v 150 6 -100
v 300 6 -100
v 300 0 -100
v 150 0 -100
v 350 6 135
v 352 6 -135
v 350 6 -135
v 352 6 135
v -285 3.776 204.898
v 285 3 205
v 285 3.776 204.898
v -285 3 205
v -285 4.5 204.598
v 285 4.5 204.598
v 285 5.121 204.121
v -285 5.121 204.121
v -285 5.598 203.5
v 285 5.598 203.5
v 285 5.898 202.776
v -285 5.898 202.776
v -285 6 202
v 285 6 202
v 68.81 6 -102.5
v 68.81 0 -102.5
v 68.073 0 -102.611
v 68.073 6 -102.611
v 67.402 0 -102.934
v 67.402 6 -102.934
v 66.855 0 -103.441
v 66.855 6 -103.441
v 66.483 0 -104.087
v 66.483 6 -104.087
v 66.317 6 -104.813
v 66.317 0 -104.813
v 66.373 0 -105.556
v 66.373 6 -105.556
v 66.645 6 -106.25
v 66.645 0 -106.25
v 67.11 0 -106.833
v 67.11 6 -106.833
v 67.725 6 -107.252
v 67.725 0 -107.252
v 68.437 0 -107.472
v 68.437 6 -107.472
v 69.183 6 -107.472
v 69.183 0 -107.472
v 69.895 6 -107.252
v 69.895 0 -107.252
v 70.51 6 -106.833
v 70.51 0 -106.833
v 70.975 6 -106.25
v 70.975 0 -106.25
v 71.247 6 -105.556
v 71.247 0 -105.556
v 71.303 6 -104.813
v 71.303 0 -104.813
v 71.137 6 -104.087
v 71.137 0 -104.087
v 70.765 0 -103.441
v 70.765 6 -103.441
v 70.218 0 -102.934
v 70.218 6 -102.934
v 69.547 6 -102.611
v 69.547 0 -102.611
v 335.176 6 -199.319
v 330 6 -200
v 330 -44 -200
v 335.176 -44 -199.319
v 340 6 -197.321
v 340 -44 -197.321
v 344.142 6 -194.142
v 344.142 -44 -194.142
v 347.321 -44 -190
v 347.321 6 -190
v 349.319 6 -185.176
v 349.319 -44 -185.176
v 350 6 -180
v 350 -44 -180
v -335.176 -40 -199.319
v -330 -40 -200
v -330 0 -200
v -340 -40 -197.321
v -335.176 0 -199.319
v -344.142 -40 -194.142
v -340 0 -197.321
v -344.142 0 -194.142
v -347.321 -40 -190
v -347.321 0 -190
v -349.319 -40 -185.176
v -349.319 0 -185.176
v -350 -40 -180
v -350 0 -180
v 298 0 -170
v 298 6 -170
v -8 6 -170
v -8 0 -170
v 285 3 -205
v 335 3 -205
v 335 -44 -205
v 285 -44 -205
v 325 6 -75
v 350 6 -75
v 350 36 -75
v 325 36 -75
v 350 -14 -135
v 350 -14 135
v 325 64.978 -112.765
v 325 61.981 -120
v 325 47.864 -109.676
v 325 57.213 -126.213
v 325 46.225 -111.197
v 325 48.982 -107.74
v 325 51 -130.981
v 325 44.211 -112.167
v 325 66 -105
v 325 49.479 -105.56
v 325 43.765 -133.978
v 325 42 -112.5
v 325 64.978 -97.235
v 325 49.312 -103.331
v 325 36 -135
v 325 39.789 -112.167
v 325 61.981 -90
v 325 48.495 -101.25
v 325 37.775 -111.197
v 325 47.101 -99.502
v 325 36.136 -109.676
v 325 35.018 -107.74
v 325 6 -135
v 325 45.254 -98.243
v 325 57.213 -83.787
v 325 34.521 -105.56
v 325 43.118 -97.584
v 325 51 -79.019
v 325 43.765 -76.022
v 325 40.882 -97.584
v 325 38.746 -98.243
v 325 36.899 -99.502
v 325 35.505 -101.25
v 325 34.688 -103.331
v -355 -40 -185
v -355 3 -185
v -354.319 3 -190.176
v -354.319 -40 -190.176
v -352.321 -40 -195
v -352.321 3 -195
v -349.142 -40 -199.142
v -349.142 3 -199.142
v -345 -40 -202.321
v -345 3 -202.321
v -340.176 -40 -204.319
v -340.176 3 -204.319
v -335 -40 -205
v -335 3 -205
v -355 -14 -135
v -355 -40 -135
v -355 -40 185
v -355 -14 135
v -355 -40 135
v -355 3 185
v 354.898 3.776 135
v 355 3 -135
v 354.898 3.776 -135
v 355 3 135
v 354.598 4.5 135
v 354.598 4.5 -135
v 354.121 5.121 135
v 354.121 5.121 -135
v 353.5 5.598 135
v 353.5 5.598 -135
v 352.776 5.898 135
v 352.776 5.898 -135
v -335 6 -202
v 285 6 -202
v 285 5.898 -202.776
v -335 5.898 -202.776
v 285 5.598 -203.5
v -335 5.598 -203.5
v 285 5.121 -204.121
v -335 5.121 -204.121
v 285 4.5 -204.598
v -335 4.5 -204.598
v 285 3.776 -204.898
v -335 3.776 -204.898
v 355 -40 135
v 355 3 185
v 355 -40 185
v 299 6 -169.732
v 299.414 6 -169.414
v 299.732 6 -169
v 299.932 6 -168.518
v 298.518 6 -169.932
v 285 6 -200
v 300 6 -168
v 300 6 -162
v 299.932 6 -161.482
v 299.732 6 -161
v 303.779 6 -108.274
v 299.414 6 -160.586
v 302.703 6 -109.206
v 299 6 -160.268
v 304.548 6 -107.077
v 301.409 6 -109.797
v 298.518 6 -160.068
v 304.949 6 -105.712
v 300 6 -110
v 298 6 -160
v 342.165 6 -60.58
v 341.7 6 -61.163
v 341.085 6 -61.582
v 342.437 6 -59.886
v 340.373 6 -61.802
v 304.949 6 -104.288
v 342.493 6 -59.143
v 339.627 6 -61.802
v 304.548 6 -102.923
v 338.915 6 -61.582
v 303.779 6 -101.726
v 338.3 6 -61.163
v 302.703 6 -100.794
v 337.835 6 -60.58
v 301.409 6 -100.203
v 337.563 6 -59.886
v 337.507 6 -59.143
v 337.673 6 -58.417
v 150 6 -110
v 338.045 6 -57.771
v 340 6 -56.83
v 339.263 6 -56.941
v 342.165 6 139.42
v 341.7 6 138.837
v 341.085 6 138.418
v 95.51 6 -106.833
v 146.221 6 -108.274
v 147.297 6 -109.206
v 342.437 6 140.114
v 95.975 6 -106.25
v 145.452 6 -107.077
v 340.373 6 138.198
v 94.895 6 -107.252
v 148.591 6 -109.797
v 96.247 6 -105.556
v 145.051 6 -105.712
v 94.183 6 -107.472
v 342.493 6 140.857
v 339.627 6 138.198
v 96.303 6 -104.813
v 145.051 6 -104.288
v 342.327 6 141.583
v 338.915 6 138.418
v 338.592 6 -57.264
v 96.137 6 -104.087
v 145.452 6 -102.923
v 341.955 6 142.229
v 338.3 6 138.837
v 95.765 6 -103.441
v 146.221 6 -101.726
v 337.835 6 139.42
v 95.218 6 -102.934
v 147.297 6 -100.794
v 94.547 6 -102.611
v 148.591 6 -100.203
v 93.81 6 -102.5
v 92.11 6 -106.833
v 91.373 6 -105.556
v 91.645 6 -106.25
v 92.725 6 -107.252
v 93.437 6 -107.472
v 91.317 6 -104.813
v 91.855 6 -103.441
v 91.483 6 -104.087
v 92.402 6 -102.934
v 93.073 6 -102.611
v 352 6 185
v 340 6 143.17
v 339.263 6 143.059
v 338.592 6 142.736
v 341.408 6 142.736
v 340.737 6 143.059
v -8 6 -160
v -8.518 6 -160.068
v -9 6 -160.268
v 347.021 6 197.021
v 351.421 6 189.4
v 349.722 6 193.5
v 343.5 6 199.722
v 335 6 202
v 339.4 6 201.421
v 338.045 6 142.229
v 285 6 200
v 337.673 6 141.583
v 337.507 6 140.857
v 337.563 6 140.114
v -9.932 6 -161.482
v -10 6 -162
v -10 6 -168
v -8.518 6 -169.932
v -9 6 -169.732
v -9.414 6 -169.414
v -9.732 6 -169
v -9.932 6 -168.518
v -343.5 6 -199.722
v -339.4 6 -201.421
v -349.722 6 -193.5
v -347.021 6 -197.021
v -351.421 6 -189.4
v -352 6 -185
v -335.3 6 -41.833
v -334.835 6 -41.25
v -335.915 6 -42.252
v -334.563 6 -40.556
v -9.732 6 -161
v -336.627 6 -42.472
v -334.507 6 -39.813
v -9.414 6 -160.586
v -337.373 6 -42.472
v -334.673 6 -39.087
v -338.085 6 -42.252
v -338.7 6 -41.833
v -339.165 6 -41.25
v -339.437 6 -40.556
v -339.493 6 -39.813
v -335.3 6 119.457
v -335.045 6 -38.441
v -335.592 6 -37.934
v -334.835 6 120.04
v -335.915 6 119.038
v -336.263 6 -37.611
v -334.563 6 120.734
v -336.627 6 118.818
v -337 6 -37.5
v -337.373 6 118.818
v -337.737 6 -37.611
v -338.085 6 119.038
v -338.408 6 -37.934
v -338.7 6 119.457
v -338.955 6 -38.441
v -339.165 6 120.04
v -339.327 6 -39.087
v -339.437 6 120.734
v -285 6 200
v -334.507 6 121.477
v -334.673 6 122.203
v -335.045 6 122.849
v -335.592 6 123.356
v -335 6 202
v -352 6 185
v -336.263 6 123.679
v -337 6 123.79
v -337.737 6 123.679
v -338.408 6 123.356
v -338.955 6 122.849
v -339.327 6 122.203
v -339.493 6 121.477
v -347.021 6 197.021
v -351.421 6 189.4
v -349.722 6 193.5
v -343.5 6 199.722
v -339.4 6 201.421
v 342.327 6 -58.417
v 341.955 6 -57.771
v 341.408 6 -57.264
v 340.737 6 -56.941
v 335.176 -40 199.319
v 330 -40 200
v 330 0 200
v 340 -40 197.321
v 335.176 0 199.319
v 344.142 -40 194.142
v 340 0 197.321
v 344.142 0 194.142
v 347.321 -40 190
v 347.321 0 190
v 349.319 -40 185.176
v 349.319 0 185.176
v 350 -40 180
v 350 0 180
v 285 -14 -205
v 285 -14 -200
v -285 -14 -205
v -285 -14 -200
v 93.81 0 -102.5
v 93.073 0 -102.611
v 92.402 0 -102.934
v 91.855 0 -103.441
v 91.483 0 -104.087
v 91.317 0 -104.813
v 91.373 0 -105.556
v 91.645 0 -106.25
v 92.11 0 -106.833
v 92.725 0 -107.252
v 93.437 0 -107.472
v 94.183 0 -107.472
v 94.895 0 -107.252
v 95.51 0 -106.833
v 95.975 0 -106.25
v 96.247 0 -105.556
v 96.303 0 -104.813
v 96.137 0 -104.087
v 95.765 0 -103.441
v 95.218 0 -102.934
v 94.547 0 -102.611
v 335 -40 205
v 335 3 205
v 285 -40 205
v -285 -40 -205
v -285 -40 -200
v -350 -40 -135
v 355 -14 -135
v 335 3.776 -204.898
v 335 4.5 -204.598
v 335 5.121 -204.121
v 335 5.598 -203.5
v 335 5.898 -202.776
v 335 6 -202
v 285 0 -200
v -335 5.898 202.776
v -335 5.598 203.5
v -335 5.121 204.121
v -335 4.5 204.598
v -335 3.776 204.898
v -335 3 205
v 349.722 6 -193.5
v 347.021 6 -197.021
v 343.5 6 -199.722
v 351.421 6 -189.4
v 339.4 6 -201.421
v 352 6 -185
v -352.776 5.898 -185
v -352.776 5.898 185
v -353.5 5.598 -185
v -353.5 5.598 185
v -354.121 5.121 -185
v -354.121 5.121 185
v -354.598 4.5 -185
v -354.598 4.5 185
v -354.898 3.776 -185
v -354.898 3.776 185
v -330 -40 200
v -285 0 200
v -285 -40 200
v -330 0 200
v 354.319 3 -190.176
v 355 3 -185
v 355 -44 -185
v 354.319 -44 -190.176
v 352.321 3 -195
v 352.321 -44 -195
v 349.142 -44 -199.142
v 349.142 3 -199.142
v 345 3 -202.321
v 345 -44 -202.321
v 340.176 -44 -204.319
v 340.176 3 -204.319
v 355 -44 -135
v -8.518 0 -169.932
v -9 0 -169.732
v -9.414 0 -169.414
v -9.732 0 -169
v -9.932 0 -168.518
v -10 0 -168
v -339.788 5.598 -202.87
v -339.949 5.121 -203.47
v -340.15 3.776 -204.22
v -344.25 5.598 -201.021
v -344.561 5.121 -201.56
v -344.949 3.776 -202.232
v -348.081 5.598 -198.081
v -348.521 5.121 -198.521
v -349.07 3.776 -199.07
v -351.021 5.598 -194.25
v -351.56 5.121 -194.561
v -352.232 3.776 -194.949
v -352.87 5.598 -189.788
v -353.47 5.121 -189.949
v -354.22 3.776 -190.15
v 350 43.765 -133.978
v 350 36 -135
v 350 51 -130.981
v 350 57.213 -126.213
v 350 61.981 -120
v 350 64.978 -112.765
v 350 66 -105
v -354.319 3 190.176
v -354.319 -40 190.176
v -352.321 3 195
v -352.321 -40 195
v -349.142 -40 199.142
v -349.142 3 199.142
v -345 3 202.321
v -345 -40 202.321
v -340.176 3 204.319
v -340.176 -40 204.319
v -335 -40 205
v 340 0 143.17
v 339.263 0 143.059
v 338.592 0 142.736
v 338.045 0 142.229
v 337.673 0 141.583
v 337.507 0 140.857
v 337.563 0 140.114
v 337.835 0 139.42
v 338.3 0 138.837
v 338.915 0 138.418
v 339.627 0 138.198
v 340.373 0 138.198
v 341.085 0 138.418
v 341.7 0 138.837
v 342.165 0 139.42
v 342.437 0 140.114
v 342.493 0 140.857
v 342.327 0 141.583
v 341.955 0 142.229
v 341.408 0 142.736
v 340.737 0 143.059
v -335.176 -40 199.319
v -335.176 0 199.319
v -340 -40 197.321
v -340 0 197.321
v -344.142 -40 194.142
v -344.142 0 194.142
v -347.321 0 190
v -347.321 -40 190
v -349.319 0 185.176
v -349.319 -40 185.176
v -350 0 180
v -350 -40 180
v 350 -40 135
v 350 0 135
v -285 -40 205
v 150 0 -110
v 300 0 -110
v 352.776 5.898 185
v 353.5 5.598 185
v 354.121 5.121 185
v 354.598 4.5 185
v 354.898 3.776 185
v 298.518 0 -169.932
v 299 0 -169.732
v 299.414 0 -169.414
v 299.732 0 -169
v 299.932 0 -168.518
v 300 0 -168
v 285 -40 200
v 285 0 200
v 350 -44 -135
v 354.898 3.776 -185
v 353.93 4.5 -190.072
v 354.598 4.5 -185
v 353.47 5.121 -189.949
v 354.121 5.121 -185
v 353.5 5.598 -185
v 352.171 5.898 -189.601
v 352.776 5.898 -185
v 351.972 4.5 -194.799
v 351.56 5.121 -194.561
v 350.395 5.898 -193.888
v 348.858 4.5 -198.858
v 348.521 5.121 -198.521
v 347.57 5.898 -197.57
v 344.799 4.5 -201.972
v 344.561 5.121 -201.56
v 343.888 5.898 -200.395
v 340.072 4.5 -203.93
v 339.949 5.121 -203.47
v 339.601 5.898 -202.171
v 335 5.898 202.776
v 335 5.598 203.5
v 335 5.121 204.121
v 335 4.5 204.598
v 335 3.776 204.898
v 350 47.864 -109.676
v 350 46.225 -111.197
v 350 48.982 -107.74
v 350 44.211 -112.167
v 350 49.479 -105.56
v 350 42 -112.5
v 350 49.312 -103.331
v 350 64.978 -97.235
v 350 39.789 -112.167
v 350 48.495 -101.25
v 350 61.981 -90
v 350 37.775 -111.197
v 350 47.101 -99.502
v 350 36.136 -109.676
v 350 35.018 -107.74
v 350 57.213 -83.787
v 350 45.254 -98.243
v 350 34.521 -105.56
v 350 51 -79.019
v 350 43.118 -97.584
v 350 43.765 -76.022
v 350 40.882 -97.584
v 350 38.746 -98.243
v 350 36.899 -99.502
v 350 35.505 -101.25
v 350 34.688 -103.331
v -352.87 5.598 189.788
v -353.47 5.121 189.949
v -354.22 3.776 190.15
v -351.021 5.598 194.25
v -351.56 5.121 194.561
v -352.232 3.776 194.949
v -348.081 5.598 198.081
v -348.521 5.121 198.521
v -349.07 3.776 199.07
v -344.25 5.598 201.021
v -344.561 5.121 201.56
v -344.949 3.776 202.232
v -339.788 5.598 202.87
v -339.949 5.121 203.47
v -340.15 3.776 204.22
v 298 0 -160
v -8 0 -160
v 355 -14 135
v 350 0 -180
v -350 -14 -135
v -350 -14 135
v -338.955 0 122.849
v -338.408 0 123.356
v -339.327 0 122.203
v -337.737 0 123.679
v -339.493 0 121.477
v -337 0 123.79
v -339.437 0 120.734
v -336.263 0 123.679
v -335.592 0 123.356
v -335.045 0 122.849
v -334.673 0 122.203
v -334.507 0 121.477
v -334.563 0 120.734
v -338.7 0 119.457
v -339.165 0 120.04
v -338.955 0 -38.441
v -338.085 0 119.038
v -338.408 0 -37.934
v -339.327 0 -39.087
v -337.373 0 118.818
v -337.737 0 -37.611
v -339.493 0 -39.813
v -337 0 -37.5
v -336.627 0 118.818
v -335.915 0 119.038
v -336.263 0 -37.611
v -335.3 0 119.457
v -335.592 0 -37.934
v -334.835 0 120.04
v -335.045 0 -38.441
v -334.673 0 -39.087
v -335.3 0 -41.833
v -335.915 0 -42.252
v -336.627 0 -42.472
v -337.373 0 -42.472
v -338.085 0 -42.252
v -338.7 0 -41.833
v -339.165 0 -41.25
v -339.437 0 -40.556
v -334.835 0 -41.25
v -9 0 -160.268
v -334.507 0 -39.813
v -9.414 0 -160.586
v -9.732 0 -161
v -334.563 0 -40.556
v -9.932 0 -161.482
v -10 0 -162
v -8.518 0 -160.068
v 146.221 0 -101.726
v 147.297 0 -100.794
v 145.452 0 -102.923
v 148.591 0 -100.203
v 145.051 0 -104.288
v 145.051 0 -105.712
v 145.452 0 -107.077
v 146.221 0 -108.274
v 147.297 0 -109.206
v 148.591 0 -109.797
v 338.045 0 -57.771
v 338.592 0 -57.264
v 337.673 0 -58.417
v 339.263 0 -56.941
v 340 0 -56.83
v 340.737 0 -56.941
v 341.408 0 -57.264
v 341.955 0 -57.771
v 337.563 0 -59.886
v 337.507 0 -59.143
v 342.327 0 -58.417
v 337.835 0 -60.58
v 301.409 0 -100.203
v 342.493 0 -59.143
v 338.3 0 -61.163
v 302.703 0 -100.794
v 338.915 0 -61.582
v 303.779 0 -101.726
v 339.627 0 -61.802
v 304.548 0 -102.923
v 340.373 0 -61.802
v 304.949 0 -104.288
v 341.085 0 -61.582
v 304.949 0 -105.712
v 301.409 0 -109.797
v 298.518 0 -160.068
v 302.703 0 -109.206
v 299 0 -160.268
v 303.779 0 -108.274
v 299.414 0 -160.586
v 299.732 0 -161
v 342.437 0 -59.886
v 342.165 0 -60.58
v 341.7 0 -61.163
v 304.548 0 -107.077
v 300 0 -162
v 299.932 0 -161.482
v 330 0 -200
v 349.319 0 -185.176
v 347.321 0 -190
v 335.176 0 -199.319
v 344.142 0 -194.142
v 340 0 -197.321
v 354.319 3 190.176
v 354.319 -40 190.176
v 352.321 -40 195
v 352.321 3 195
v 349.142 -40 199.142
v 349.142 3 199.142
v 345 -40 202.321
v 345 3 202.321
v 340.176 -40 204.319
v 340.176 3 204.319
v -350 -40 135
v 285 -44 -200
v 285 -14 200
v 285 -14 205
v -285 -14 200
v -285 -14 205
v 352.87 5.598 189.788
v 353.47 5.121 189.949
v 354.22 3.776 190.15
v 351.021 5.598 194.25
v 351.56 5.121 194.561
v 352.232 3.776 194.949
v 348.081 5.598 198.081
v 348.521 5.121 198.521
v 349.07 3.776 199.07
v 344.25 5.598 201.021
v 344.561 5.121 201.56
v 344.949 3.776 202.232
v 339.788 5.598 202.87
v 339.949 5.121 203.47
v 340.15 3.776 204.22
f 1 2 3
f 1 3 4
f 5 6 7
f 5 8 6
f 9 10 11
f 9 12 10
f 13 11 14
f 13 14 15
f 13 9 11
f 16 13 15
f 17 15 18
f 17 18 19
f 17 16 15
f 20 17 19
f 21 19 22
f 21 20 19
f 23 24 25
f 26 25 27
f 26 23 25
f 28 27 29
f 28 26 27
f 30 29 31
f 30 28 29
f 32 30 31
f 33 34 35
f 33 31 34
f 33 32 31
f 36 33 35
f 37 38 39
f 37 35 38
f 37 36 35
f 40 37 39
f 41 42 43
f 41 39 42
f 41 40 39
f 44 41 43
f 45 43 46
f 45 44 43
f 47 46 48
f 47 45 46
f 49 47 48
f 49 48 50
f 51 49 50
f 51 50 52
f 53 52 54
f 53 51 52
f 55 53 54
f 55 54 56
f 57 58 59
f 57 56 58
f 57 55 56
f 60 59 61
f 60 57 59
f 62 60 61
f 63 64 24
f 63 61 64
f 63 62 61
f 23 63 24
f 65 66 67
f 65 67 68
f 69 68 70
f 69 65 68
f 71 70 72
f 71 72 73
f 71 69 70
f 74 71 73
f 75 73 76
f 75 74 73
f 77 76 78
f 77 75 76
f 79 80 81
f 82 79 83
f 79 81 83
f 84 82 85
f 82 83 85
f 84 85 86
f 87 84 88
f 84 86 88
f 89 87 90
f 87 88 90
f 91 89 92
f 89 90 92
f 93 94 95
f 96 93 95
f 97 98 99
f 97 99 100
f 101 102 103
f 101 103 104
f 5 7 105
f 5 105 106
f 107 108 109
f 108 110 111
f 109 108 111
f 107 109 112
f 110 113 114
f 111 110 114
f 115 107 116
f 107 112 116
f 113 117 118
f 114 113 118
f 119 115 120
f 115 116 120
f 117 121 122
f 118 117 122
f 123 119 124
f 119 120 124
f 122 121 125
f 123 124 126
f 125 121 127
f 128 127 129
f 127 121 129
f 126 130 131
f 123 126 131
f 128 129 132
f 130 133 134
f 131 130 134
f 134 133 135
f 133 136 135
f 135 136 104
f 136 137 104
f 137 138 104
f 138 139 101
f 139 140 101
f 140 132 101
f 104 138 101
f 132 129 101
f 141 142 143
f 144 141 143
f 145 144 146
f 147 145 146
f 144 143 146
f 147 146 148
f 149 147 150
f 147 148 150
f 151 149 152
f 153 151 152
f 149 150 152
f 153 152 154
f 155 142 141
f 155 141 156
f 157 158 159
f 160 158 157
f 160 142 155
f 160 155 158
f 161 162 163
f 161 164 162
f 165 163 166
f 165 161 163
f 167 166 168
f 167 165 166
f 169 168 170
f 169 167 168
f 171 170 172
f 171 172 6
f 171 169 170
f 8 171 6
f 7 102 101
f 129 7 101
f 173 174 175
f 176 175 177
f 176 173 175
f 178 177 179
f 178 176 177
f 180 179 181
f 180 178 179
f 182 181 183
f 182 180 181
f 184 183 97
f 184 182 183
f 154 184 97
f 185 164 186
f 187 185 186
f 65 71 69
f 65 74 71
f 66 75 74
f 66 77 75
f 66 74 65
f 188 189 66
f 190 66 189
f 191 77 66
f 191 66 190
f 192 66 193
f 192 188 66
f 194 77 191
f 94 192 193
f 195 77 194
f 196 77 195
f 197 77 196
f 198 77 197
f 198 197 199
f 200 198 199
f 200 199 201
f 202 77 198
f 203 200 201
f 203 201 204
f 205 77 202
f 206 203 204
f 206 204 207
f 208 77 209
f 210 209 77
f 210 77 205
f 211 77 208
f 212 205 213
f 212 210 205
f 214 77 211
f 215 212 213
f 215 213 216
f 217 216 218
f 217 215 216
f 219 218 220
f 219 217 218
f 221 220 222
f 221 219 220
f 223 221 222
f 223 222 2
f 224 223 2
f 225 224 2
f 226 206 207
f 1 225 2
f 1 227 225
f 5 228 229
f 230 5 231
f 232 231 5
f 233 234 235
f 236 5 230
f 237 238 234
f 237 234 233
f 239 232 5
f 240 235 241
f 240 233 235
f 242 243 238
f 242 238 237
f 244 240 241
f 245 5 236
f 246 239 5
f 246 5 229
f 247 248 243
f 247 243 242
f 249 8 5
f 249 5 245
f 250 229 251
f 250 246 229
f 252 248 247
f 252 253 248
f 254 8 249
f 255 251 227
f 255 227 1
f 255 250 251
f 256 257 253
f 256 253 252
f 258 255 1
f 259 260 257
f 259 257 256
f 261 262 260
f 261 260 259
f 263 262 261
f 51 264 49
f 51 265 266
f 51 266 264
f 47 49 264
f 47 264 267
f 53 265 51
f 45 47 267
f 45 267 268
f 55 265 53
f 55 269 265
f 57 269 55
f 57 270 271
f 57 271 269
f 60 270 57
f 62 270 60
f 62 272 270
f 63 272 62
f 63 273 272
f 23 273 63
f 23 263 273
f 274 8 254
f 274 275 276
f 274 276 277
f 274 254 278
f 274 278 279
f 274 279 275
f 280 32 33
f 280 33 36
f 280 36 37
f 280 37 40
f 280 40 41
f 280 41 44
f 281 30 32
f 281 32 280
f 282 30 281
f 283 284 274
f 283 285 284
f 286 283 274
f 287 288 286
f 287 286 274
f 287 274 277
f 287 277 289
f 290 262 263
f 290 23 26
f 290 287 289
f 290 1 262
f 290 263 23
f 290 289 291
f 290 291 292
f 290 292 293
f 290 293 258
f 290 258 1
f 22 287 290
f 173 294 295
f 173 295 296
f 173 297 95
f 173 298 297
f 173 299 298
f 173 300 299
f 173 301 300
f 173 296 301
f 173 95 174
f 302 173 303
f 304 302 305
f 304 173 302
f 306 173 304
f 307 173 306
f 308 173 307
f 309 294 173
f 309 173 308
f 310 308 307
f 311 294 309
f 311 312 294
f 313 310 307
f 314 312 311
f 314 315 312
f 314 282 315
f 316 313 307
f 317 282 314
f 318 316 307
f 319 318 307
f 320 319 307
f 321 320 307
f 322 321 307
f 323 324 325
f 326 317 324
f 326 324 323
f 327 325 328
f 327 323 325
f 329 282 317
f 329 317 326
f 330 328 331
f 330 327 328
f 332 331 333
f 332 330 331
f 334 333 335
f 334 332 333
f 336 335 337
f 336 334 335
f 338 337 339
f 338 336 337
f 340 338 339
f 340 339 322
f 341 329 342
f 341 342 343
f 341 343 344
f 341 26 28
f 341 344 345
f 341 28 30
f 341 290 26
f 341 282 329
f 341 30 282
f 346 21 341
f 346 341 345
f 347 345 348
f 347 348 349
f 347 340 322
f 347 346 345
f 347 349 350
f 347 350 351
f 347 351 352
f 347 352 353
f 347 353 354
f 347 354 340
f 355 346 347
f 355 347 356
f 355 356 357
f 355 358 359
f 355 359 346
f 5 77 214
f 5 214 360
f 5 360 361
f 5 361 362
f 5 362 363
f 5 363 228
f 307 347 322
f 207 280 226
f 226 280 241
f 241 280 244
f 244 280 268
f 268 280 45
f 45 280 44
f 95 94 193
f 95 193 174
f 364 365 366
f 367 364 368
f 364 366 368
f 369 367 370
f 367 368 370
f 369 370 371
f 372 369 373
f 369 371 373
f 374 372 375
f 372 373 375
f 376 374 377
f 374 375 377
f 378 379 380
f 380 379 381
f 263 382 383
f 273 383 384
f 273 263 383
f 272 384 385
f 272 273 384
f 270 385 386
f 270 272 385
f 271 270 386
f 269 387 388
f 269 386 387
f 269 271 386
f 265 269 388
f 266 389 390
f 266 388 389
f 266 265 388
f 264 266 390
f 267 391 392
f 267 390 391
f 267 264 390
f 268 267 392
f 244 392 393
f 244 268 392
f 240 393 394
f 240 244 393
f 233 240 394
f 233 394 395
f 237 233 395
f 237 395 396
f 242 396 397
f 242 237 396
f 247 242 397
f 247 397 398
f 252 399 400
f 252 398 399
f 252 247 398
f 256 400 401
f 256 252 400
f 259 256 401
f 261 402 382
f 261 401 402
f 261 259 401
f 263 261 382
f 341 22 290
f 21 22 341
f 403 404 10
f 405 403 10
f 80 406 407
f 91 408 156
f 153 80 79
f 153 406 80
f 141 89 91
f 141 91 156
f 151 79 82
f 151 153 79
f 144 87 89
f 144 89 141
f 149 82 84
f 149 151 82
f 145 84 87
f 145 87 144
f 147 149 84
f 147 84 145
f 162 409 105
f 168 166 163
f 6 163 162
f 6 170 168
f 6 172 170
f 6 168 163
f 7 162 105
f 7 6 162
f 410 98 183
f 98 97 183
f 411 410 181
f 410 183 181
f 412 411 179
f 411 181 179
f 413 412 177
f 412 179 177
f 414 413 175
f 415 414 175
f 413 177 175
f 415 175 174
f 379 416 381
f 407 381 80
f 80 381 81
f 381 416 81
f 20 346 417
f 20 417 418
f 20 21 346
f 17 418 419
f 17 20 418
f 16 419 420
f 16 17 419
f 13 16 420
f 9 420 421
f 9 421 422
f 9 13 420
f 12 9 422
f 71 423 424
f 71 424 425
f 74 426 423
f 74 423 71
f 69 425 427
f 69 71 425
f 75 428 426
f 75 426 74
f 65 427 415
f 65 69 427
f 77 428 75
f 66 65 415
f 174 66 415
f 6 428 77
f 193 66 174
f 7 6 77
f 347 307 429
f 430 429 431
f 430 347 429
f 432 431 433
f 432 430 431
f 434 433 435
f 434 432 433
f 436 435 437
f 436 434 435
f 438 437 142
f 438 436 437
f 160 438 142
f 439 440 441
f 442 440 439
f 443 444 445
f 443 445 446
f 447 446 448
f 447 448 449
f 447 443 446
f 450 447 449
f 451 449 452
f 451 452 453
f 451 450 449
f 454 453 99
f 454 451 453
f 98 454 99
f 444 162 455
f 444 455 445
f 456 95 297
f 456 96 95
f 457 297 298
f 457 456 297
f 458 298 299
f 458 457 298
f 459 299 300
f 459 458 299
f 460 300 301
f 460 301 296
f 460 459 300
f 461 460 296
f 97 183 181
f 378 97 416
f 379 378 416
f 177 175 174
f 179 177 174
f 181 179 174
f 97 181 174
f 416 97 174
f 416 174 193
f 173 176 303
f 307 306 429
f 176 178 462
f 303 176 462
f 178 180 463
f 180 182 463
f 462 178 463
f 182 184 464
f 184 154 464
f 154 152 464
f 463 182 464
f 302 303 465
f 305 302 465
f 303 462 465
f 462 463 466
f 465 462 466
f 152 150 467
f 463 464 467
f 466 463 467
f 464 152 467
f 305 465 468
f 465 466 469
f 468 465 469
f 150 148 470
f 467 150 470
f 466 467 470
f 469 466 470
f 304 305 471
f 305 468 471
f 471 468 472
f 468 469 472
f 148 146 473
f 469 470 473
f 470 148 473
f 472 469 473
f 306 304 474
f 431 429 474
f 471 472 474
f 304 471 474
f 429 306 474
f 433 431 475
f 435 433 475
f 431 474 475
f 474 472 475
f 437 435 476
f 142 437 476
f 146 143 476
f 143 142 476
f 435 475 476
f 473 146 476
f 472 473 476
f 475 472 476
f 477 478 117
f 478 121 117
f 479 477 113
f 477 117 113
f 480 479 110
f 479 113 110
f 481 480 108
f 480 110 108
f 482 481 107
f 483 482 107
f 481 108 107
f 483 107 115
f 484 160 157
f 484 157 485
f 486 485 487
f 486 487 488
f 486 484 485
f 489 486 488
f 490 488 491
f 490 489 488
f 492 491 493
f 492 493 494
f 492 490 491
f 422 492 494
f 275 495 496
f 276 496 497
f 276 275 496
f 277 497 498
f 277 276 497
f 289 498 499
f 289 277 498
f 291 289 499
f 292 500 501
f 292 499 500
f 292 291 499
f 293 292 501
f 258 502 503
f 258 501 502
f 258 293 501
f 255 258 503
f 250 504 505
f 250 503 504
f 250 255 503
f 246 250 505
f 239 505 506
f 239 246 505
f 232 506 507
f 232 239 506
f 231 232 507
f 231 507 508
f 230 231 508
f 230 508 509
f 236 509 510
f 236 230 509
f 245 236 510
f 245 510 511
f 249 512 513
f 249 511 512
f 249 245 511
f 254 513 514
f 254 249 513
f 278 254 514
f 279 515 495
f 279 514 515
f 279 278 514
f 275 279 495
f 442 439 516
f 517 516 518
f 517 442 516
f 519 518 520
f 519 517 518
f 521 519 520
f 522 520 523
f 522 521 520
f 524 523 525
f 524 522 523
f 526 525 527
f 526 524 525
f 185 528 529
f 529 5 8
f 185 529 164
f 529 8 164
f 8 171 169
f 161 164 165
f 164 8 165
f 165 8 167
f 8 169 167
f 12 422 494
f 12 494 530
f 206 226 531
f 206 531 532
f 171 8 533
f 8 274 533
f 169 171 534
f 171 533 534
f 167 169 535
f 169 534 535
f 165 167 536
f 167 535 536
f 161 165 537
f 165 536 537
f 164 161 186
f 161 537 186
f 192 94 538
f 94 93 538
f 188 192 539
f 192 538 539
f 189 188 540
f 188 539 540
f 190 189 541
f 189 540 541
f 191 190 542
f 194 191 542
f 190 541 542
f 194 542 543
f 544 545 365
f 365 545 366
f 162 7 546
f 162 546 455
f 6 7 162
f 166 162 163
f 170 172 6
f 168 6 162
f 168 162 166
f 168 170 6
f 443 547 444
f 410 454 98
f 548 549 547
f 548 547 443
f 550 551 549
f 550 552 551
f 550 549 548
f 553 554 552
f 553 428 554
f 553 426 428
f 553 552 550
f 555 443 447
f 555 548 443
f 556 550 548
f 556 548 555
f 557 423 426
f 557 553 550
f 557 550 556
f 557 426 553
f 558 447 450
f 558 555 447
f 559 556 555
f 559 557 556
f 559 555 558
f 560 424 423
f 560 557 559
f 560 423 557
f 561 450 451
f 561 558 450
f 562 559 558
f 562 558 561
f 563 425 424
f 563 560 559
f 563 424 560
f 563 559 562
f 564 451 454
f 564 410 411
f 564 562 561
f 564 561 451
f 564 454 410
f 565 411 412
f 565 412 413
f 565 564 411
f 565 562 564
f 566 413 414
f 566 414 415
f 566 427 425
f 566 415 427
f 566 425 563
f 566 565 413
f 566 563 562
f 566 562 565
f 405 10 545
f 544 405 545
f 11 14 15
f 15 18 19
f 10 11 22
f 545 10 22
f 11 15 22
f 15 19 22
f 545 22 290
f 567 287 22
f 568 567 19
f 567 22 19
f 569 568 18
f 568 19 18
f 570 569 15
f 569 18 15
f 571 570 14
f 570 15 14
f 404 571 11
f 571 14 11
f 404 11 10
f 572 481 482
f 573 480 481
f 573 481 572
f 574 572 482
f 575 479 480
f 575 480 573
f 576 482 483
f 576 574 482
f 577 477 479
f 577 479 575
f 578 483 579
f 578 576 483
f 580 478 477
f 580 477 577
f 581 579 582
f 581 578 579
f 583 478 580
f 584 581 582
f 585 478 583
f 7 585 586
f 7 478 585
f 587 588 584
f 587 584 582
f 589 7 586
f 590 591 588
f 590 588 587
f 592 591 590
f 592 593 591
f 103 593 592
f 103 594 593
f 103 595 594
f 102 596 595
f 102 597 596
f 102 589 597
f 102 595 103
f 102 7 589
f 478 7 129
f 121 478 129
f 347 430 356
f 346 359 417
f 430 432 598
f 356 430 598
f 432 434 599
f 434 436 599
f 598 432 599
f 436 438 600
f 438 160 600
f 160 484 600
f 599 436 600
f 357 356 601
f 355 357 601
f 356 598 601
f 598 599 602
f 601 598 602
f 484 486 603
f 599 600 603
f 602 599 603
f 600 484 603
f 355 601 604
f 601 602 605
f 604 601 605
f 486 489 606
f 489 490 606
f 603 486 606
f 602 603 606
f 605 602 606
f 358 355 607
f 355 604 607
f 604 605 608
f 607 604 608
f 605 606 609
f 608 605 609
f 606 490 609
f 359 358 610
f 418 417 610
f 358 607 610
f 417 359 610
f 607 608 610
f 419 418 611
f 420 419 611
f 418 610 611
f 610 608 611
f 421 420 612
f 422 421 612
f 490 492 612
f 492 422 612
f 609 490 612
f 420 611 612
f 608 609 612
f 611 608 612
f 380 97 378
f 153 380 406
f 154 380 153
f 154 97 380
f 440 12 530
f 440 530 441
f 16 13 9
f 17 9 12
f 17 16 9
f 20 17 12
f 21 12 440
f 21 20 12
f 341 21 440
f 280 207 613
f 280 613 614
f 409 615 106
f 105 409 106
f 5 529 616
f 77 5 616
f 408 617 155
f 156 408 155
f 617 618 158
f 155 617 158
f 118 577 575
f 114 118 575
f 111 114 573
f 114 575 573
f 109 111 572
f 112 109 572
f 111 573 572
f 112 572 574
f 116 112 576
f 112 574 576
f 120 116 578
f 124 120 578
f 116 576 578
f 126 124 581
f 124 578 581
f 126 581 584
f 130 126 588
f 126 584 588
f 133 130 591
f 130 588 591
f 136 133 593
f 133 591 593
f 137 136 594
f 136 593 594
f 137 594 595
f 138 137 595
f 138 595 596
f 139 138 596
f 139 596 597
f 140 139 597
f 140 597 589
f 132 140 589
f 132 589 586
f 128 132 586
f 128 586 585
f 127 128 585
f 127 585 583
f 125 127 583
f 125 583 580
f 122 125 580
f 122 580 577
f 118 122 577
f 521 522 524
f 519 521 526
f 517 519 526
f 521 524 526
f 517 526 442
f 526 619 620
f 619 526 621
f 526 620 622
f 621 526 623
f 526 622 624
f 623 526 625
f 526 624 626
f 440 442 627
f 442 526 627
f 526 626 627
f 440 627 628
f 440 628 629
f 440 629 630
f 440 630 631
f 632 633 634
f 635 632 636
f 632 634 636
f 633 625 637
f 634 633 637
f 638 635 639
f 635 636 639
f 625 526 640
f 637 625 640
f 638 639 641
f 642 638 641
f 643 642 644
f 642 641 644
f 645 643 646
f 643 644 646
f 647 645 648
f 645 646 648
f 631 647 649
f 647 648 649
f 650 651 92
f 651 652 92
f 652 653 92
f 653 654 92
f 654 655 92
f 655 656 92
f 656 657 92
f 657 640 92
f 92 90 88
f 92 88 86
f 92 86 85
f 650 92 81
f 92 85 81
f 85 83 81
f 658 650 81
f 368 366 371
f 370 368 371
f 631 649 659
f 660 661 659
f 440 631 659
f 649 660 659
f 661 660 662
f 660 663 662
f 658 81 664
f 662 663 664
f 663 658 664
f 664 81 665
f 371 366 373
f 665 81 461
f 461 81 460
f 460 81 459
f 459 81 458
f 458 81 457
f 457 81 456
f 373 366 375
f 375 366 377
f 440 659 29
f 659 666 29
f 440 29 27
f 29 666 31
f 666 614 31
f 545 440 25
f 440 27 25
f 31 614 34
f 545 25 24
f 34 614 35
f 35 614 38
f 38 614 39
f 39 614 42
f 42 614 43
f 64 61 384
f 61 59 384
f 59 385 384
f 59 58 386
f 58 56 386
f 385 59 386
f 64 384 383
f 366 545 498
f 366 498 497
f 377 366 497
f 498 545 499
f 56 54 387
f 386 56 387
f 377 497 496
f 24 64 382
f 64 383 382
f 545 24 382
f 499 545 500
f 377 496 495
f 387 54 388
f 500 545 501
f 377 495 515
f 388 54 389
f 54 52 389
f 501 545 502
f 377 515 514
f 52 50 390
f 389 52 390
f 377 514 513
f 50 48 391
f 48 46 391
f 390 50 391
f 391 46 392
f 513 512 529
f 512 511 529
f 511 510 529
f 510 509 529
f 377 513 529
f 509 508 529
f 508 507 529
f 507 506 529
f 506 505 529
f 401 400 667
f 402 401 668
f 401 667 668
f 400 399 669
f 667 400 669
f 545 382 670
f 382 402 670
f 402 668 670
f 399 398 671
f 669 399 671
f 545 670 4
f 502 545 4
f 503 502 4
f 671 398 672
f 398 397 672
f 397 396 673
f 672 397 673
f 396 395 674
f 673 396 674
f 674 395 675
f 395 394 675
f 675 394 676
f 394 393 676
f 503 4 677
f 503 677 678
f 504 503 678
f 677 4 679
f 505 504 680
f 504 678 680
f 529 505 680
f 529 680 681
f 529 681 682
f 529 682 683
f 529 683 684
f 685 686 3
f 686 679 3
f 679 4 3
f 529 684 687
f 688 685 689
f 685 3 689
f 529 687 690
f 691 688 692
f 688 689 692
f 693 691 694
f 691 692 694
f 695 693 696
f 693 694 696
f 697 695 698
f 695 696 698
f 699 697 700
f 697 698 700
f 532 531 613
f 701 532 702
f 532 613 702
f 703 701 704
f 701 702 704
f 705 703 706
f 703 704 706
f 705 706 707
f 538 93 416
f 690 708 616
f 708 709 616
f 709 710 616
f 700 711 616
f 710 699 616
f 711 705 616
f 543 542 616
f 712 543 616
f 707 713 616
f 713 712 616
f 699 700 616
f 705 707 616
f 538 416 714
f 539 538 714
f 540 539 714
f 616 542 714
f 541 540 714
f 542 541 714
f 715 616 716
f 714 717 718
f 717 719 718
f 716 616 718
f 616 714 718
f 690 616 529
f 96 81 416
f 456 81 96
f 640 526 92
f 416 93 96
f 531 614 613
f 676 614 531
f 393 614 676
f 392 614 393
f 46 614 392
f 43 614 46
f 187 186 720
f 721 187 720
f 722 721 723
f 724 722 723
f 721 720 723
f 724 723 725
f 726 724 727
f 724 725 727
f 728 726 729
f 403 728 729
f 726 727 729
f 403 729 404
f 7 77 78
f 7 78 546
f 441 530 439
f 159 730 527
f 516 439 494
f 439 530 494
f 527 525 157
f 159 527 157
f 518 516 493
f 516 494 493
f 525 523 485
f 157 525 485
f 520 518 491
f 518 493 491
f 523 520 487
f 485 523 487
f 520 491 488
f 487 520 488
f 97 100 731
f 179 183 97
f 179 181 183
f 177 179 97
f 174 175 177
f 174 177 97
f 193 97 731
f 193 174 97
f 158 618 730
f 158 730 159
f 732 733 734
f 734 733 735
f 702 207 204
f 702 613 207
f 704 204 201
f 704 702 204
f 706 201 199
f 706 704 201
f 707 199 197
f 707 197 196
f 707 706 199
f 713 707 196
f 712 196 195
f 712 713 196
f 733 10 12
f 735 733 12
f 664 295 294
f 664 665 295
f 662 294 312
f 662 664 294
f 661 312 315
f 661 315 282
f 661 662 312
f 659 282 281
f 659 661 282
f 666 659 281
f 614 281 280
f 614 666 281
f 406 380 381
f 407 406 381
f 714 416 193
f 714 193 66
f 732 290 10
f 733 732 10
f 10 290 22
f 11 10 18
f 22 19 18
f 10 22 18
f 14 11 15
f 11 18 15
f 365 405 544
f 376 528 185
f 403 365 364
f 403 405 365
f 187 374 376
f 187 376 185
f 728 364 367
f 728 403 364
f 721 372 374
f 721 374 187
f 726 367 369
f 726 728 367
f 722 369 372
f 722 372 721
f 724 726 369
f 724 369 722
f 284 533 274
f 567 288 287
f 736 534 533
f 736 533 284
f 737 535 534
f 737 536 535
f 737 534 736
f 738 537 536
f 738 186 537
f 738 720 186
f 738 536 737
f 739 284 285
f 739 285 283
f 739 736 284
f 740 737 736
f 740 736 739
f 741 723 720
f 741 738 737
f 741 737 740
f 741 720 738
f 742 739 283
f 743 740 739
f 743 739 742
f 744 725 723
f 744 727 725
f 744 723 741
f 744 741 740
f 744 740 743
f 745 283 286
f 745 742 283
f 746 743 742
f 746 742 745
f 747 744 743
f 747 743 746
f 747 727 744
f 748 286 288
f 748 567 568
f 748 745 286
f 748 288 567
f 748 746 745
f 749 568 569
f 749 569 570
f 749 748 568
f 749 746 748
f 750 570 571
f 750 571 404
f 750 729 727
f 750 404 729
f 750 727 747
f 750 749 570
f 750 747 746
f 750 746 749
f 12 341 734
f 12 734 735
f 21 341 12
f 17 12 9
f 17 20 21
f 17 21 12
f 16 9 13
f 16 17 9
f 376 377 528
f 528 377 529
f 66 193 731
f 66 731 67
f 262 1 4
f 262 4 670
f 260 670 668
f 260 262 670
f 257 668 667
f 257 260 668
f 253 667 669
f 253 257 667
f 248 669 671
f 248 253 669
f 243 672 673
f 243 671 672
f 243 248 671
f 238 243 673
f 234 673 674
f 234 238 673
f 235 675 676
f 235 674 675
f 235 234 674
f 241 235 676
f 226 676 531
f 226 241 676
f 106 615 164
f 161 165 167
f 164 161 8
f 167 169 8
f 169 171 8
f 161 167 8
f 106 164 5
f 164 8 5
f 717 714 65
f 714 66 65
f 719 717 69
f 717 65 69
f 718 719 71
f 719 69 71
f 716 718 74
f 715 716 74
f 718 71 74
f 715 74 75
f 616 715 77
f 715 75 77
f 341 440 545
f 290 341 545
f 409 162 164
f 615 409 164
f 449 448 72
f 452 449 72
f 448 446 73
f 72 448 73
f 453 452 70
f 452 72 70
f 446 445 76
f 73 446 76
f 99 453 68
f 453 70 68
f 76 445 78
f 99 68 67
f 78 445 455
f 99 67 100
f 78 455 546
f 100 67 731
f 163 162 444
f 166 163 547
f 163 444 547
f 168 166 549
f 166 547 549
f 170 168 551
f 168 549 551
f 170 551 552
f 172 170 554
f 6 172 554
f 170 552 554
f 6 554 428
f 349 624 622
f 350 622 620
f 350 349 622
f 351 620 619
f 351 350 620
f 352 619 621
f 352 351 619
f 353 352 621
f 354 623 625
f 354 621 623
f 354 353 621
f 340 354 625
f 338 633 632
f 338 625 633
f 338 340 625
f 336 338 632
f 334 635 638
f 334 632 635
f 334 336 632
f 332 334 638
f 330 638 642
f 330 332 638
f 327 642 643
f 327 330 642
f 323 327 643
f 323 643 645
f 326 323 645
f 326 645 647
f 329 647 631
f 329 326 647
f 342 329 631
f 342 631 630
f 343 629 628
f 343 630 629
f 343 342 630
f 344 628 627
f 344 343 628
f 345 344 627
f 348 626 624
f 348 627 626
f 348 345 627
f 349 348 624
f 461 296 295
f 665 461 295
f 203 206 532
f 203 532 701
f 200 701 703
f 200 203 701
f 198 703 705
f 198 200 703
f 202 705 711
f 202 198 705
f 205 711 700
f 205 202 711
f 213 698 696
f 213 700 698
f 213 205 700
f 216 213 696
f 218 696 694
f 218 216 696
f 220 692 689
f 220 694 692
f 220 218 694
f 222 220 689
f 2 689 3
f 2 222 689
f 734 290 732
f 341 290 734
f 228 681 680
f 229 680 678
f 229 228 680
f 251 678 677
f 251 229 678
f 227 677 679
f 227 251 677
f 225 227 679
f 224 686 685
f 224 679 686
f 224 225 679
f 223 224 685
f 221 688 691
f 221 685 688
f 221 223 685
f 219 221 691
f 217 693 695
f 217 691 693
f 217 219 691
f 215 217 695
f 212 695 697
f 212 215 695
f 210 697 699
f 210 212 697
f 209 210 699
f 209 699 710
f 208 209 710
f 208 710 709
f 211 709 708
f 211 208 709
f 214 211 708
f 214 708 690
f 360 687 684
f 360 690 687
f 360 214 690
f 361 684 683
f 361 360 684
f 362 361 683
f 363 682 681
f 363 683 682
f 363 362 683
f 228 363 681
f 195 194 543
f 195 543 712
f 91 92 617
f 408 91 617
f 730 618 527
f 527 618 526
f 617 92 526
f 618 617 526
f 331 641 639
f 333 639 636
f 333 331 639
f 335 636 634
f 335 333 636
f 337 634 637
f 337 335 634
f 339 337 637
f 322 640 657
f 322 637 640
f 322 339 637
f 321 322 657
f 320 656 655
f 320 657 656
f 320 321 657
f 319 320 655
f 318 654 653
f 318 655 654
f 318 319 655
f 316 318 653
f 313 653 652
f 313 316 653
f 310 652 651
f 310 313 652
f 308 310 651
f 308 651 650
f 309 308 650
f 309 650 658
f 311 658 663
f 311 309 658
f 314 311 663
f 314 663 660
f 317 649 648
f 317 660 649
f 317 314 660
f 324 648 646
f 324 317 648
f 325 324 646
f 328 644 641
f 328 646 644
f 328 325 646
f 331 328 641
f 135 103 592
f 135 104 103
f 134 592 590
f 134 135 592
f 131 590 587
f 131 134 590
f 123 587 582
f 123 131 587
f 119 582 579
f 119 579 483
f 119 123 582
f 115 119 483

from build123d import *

# Parameters (mm, degrees)
SKETCH1_W                         = 700
SKETCH1_H                         = 400
BOSS_EXTRUDE1_DEPTH               = 6
SKETCH3_W                         = 310
SKETCH3_H                         = 10
CUT_EXTRUDE1_DEPTH                = 26
FILLET1_R                         = 2
FILLET2_R                         = 20
BOSS_EXTRUDE2_START               = -6
BOSS_EXTRUDE2_DEPTH               = 46
BOSS_EXTRUDE3_DEPTH               = 50
SKETCH10_W                        = 570
SKETCH10_H                        = 5
BOSS_EXTRUDE4_DEPTH               = 20
SKETCH11_W                        = 5
SKETCH11_H                        = 270
BOSS_EXTRUDE5_DEPTH               = 20
LPATTERN1_COUNT                   = 2
LPATTERN1_PITCH                   = 405
LPATTERN2_COUNT                   = 2
LPATTERN2_PITCH                   = 705
FILLET3_R                         = 3
FILLET4_R                         = 3
FILLET5_R                         = 3
FILLET6_R                         = 3
FILLET7_R                         = 3
F_5_0_5_DIAMETER_HOLE1_AT_2_COUNT = 2
F_5_0_5_DIAMETER_HOLE1_AT_2_PITCH = 25
SKETCH14_W                        = 25
SKETCH14_H                        = 60
BOSS_EXTRUDE6_DEPTH               = 60
FILLET8_R                         = 30
CUT_EXTRUDE2_DEPTH                = 60
SKETCH16_R                        = 7.5
CUT_EXTRUDE3_DEPTH                = 40
F_5_0_5_DIAMETER_HOLE2_AT_2_COUNT = 2
F_5_0_5_DIAMETER_HOLE2_AT_2_PITCH = 200
F_5_0_5_DIAMETER_HOLE3_AT_2_COUNT = 2
F_5_0_5_DIAMETER_HOLE3_AT_2_PITCH = 161.29


with BuildPart() as part:
    # Sketch1 → Boss-Extrude1 (new body)
    with BuildSketch(Plane(origin=(0, 0, 0), x_dir=(1, 0, 0), z_dir=(0, 1, 0))):
        Rectangle(SKETCH1_W, SKETCH1_H)
    extrude(amount=BOSS_EXTRUDE1_DEPTH)

    # Sketch3 → Cut-Extrude1 (cut)
    with BuildSketch(Plane(origin=(0, 6, 0), x_dir=(-1, 0, 0), z_dir=(0, 1, 0))):
        with Locations((-145, -165)):
            Rectangle(SKETCH3_W, SKETCH3_H)
    extrude(amount=-CUT_EXTRUDE1_DEPTH, mode=Mode.SUBTRACT)

    # Fillet1
    fillet1_edges = [part.edges().sort_by_distance(p)[0] for p in [
        (-10, 3, -160),
        (-10, 3, -170),
        (300, 3, -170),
        (300, 3, -160),
    ]]
    fillet(fillet1_edges, radius=FILLET1_R)

    # Fillet2
    fillet2_edges = [part.edges().sort_by_distance(p)[0] for p in [
        (-350, 3, -200),
        (350, 3, -200),
        (350, 3, 200),
        (-350, 3, 200),
    ]]
    fillet(fillet2_edges, radius=FILLET2_R)


with BuildPart() as body_2:
    # Sketch8 → Boss-Extrude2 (new body)
    with BuildSketch(Plane.XZ.offset(BOSS_EXTRUDE2_START)):
        with BuildLine():
            Line((-355, 135), (-355, 185))
            ThreePointArc((-355, 185), (-349.142135624, 199.142135624), (-335, 205))
            Line((-335, 205), (-285, 205))
            Line((-285, 205), (-285, 200))
            Line((-285, 200), (-330, 200))
            ThreePointArc((-330, 200), (-344.142135624, 194.142135624), (-350, 180))
            Line((-350, 180), (-350, 135))
            Line((-350, 135), (-355, 135))
        make_face()
    boss_extrude2 = extrude(amount=BOSS_EXTRUDE2_DEPTH)


with BuildPart() as part_1:
    add(part.part)

    # Mirror3: Boss-Extrude2 across plane
    add(boss_extrude2.mirror(Plane.XY))

    # Mirror6: Boss-Extrude2 across plane
    add(boss_extrude2.mirror(Plane(origin=(0, 0, 0), x_dir=(0, 0, 1), z_dir=(1, 0, 0))))


with BuildPart() as body_3:
    # Sketch9 → Boss-Extrude3 (new body)
    with BuildSketch(Plane(origin=(0, 6, 0), x_dir=(-1, 0, 0), z_dir=(0, 1, 0))):
        with BuildLine():
            Line((-355, -135), (-355, -185))
            ThreePointArc((-355, -185), (-349.142135624, -199.142135624), (-335, -205))
            Line((-335, -205), (-285, -205))
            Line((-285, -205), (-285, -200))
            Line((-285, -200), (-330, -200))
            ThreePointArc((-330, -200), (-344.142135624, -194.142135624), (-350, -180))
            Line((-350, -180), (-350, -135))
            Line((-350, -135), (-355, -135))
        make_face()
    extrude(amount=-BOSS_EXTRUDE3_DEPTH)

    # Fillet6
    fillet6_edges = [body_3.edges().sort_by_distance(p)[0] for p in [
        (355, 6, -160),
        (310, 6, -205),
        (349.142135624, 6, -199.142135624),
    ]]
    fillet(fillet6_edges, radius=FILLET6_R)


with BuildPart() as body_4:
    # Sketch10 → Boss-Extrude4 (new body)
    with BuildSketch(Plane(origin=(0, 6, 0), x_dir=(-1, 0, 0), z_dir=(0, 1, 0))):
        with Locations((0, 202.5)):
            Rectangle(SKETCH10_W, SKETCH10_H)
    boss_extrude4 = extrude(amount=-BOSS_EXTRUDE4_DEPTH)

    # Fillet3
    fillet3_edges = [body_4.edges().sort_by_distance(p)[0] for p in [
        (0, 6, 205),
    ]]
    fillet(fillet3_edges, radius=FILLET3_R)


with BuildPart() as body_5:
    # Sketch11 → Boss-Extrude5 (new body)
    with BuildSketch(Plane(origin=(0, 6, 0), x_dir=(-1, 0, 0), z_dir=(0, 1, 0))):
        with Locations((-352.5, 0)):
            Rectangle(SKETCH11_W, SKETCH11_H)
    boss_extrude5 = extrude(amount=-BOSS_EXTRUDE5_DEPTH)

    # Fillet4
    fillet4_edges = [body_5.edges().sort_by_distance(p)[0] for p in [
        (355, 6, 0),
    ]]
    fillet(fillet4_edges, radius=FILLET4_R)


with BuildPart() as part_2:
    add(part_1.part)

    # LPattern1: Boss-Extrude4 ×2
    with Locations(*[(0, 0, -i * LPATTERN1_PITCH) for i in range(1, LPATTERN1_COUNT)]):
        add(boss_extrude4)

    add(body_2.part)  # LPattern2 merges body 2
    # LPattern2: Boss-Extrude5 ×2
    with Locations(*[(-i * LPATTERN2_PITCH, 0, 0) for i in range(1, LPATTERN2_COUNT)]):
        add(boss_extrude5)

    # Fillet5
    fillet5_edges = [part_2.edges().sort_by_distance(p)[0] for p in [
        (310, 6, 205),
        (349.142135624, 6, 199.142135624),
        (355, 6, 160),
    ]]
    fillet(fillet5_edges, radius=FILLET5_R)

    # Fillet7
    fillet7_edges = [part_2.edges().sort_by_distance(p)[0] for p in [
        (-310, 6, 205),
        (-349.142135624, 6, 199.142135624),
        (-355, 6, 0),
        (-25, 6, -205),
        (-349.142135624, 6, -199.142135624),
    ]]
    fillet(fillet7_edges, radius=FILLET7_R)

    # Sketch12 → Ø5.0 (5) Diameter Hole1 (revolve, cut)
    with BuildSketch(Plane(origin=(68.81, 6, -105), x_dir=(0, 0, 1), z_dir=(1, 0, 0))):
        Polygon((0, 0), (0, 12.502151548), (2.5, 11), (2.5, 0), align=None)
    f_5_0_5_diameter_hole1 = revolve(axis=Axis((68.81, 12.35, -105), (0, -1, 0)), mode=Mode.SUBTRACT)

    # Ø5.0 (5) Diameter Hole1 at 2: Ø5.0 (5) Diameter Hole1 ×2
    with Locations(*[(i * F_5_0_5_DIAMETER_HOLE1_AT_2_PITCH, 0, 0) for i in range(1, F_5_0_5_DIAMETER_HOLE1_AT_2_COUNT)]):
        add(f_5_0_5_diameter_hole1, mode=Mode.SUBTRACT)

    # Sketch15 → Cut-Extrude2 (cut)
    with BuildSketch(Plane(origin=(0, 6, 0), x_dir=(-1, 0, 0), z_dir=(0, 1, 0))):
        with BuildLine():
            Line((-150, -110), (-300, -110))
            ThreePointArc((-300, -110), (-305, -105), (-300, -100))
            Line((-300, -100), (-150, -100))
            ThreePointArc((-150, -100), (-145, -105), (-150, -110))
        make_face()
    extrude(amount=-CUT_EXTRUDE2_DEPTH, mode=Mode.SUBTRACT)

    # Sketch17 → Ø5.0 (5) Diameter Hole2 (revolve, cut)
    with BuildSketch(Plane(origin=(340, 6, 140.67), x_dir=(0, 0, 1), z_dir=(1, 0, 0))):
        Polygon((0, 0), (0, 12.502151548), (2.5, 11), (2.5, 0), align=None)
    f_5_0_5_diameter_hole2 = revolve(axis=Axis((340, 12.35, 140.67), (0, -1, 0)), mode=Mode.SUBTRACT)

    # Ø5.0 (5) Diameter Hole2 at 2: Ø5.0 (5) Diameter Hole2 ×2
    with Locations(*[(0, 0, -i * F_5_0_5_DIAMETER_HOLE2_AT_2_PITCH) for i in range(1, F_5_0_5_DIAMETER_HOLE2_AT_2_COUNT)]):
        add(f_5_0_5_diameter_hole2, mode=Mode.SUBTRACT)

    # Sketch19 → Ø5.0 (5) Diameter Hole3 (revolve, cut)
    with BuildSketch(Plane(origin=(-337, 6, -40), x_dir=(0, 0, 1), z_dir=(1, 0, 0))):
        Polygon((0, 0), (0, 12.502151548), (2.5, 11), (2.5, 0), align=None)
    f_5_0_5_diameter_hole3 = revolve(axis=Axis((-337, 12.35, -40), (0, -1, 0)), mode=Mode.SUBTRACT)

    # Ø5.0 (5) Diameter Hole3 at 2: Ø5.0 (5) Diameter Hole3 ×2
    with Locations(*[(0, 0, i * F_5_0_5_DIAMETER_HOLE3_AT_2_PITCH) for i in range(1, F_5_0_5_DIAMETER_HOLE3_AT_2_COUNT)]):
        add(f_5_0_5_diameter_hole3, mode=Mode.SUBTRACT)


with BuildPart() as body_5_2:
    # Sketch14 → Boss-Extrude6 (new body)
    with BuildSketch(Plane(origin=(0, 6, 0), x_dir=(-1, 0, 0), z_dir=(0, 1, 0))):
        with Locations((-337.5, -105)):
            Rectangle(SKETCH14_W, SKETCH14_H)
    extrude(amount=BOSS_EXTRUDE6_DEPTH)

    # Fillet8
    fillet8_edges = [body_5_2.edges().sort_by_distance(p)[0] for p in [
        (337.5, 66, -135),
        (337.5, 66, -75),
    ]]
    fillet(fillet8_edges, radius=FILLET8_R - 0.0001)  # a hair under: the kernel refuses the full size

    # Sketch16 → Cut-Extrude3 (cut)
    with BuildSketch(Plane(origin=(350, 0, 0), x_dir=(0, 0, -1), z_dir=(1, 0, 0))):
        with Locations((105, 42)):
            Circle(SKETCH16_R)
    extrude(amount=-CUT_EXTRUDE3_DEPTH, mode=Mode.SUBTRACT)


solid = Compound([body_3.part, body_4.part, body_5.part, part_2.part, body_5_2.part])
